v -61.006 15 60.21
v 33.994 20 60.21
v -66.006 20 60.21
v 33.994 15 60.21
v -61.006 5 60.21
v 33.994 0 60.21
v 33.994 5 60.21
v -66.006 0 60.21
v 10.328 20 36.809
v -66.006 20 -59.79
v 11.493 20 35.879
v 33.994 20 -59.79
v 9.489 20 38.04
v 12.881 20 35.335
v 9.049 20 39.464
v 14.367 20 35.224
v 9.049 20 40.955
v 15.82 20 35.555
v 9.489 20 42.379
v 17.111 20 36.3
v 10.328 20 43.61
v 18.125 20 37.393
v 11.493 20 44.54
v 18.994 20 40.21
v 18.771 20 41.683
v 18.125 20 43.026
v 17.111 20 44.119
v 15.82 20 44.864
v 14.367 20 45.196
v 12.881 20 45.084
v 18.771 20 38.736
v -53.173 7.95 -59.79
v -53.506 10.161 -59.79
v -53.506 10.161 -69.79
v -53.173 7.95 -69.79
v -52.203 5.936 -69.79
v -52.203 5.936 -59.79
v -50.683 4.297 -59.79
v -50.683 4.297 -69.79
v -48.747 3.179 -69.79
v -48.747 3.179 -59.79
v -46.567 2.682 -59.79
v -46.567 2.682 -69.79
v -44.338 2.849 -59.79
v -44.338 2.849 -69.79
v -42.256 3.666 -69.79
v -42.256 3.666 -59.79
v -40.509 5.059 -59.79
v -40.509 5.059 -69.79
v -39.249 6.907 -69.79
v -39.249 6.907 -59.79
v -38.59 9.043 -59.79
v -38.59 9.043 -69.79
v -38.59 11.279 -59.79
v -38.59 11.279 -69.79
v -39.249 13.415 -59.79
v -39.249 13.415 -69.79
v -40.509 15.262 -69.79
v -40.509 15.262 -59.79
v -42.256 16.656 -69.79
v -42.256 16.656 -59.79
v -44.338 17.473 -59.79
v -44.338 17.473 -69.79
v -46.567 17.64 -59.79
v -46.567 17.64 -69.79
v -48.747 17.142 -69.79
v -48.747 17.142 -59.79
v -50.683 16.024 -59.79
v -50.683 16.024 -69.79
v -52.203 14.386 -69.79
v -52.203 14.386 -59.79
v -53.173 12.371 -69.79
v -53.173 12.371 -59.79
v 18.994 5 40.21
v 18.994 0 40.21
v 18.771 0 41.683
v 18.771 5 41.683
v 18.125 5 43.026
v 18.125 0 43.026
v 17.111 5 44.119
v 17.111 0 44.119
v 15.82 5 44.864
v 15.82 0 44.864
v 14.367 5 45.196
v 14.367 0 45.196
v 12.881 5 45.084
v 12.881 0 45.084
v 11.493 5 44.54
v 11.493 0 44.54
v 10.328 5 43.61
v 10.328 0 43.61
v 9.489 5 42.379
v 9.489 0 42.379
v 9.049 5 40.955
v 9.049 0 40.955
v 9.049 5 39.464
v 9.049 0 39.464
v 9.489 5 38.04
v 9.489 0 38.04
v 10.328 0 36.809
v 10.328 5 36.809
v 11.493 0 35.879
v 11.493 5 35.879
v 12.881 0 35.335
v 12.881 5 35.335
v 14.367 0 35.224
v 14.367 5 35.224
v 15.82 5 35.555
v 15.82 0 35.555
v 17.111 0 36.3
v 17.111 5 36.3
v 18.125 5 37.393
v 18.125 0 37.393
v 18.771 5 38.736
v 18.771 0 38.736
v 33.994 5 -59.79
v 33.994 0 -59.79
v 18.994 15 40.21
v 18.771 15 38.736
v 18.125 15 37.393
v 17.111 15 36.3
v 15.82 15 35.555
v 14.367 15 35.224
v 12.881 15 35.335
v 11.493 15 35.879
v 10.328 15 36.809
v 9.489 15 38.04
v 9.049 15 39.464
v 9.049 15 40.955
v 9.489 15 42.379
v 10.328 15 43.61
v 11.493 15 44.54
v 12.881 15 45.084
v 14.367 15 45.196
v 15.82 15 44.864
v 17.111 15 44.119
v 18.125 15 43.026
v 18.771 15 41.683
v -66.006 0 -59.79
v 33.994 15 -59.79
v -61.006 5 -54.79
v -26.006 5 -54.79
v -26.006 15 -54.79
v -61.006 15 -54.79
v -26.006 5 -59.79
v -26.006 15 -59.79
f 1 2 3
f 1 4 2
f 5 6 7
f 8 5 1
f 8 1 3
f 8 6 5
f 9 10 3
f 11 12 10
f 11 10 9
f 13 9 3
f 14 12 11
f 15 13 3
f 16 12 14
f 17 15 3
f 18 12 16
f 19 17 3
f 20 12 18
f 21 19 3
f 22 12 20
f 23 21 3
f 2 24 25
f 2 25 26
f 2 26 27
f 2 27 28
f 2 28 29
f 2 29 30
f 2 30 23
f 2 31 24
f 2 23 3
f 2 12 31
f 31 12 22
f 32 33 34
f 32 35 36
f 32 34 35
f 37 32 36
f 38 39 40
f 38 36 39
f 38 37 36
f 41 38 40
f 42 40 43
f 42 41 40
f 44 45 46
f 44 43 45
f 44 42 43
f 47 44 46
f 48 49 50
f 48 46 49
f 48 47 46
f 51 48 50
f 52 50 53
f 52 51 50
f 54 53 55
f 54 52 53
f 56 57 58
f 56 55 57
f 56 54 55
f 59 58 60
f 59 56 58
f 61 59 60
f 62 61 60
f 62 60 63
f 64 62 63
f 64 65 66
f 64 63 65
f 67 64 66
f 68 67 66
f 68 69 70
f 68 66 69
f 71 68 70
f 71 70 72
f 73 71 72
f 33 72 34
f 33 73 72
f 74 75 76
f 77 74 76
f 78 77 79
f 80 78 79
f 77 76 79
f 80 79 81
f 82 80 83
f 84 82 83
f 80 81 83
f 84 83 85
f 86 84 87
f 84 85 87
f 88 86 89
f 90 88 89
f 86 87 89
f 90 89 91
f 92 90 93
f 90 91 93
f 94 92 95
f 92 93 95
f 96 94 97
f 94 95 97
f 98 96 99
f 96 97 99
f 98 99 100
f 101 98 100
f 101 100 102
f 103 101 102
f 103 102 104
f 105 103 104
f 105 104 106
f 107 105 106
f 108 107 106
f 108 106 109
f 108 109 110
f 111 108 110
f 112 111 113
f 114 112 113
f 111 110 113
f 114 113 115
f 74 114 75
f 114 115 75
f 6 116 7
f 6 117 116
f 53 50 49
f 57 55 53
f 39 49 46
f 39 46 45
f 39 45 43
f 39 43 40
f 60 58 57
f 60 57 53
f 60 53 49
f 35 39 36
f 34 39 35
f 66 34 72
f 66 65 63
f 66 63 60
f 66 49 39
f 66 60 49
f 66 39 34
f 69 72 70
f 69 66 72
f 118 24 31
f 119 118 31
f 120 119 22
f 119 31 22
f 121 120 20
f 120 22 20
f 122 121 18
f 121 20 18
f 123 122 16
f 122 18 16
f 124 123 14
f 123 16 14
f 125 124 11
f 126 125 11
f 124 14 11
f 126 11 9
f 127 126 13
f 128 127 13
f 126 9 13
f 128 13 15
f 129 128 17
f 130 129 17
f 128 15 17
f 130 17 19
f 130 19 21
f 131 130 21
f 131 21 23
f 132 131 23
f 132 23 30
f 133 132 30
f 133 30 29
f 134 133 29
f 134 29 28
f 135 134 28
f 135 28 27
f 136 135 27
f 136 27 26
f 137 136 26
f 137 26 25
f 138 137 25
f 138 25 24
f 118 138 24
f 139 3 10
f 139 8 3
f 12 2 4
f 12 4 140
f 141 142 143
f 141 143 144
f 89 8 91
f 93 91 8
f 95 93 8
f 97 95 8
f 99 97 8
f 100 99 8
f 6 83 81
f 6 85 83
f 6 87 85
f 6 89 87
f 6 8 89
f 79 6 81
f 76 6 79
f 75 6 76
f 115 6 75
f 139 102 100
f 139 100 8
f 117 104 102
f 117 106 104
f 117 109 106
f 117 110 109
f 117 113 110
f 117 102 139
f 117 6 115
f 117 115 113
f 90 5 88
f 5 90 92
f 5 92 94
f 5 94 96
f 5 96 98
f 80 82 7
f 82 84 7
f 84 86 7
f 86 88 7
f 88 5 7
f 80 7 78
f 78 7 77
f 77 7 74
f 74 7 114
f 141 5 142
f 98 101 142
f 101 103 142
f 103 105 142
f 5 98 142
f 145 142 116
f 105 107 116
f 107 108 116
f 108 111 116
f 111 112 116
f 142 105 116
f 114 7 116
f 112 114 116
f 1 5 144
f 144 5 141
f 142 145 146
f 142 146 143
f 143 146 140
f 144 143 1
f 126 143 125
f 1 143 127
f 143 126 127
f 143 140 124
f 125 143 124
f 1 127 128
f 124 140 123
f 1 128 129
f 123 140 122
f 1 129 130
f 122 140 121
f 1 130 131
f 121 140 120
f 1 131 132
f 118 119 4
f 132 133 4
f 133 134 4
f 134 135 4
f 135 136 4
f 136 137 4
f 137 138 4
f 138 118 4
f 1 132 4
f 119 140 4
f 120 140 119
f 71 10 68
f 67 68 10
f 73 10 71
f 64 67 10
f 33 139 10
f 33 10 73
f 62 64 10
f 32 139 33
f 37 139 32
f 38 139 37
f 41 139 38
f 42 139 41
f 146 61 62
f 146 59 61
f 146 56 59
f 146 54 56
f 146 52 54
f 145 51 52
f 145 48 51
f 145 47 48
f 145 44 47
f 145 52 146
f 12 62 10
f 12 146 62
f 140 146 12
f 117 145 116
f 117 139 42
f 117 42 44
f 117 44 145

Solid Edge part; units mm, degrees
sketch "Sketch1" plane through (0, 0, 0) normal (0, -1, 0) x (1, 0, 0)
  line L0 (-66.0065, -59.7904) -> (33.9935, -59.7904)
  line L1 (33.9935, -59.7904) -> (33.9935, 60.2096)
  line L2 (33.9935, 60.2096) -> (-66.0065, 60.2096)
  line L3 (-66.0065, 60.2096) -> (-66.0065, -59.7904)
  dimension "D1" = 100
  dimension "D2" = 120
extrude "Protrusion1" add sketch "Sketch1" against normal blind 5
sketch "Sketch2" plane through (33.9935, 0, -14.7904) normal (0, -1, 0) x (1, 0, 0)
  circle A0 centre (-20, 55) radius 5
  dimension "D1" = 10
  dimension "D2" = 20
  dimension "D3" = 20
extrude "Cutout1" cut sketch "Sketch2" against normal through all
mirror "Mirror1" about plane through (33.9935, 10, -14.7904) normal (0, 1, 0) of "Protrusion1", "Cutout1"
sketch "Sketch3" plane through (33.9935, 5, -14.7904) normal (0, 1, 0) x (-1, 0, 0)
  line L0 (95, -45) -> (100, -45)
  line L1 (100, -45) -> (100, 75)
  line L2 (100, 75) -> (95, 75)
  line L3 (95, 75) -> (95, -45)
  line L4 (100, -45) -> (60, -45)
  line L5 (60, -45) -> (60, -40)
  line L6 (60, -40) -> (100, -40)
  line L7 (100, -40) -> (100, -45)
  dimension "D1" = 40
  dimension "D2" = 5
  dimension "D3" = 120
  dimension "D4" = 5
extrude "Protrusion3" add sketch "Sketch3" along normal up to surface (10 mm away)
sketch "Sketch4" plane through (33.9935, 10, -59.7904) normal (0, 0, -1) x (-1, 0, 0)
  circle A0 centre (80, 0.1607) radius 7.5
  dimension "D1" = 20
extrude "ExtrudedProtrusion_4" add sketch "Sketch4" along normal blind 10
properties material "Aluminum, 6061-T6"
